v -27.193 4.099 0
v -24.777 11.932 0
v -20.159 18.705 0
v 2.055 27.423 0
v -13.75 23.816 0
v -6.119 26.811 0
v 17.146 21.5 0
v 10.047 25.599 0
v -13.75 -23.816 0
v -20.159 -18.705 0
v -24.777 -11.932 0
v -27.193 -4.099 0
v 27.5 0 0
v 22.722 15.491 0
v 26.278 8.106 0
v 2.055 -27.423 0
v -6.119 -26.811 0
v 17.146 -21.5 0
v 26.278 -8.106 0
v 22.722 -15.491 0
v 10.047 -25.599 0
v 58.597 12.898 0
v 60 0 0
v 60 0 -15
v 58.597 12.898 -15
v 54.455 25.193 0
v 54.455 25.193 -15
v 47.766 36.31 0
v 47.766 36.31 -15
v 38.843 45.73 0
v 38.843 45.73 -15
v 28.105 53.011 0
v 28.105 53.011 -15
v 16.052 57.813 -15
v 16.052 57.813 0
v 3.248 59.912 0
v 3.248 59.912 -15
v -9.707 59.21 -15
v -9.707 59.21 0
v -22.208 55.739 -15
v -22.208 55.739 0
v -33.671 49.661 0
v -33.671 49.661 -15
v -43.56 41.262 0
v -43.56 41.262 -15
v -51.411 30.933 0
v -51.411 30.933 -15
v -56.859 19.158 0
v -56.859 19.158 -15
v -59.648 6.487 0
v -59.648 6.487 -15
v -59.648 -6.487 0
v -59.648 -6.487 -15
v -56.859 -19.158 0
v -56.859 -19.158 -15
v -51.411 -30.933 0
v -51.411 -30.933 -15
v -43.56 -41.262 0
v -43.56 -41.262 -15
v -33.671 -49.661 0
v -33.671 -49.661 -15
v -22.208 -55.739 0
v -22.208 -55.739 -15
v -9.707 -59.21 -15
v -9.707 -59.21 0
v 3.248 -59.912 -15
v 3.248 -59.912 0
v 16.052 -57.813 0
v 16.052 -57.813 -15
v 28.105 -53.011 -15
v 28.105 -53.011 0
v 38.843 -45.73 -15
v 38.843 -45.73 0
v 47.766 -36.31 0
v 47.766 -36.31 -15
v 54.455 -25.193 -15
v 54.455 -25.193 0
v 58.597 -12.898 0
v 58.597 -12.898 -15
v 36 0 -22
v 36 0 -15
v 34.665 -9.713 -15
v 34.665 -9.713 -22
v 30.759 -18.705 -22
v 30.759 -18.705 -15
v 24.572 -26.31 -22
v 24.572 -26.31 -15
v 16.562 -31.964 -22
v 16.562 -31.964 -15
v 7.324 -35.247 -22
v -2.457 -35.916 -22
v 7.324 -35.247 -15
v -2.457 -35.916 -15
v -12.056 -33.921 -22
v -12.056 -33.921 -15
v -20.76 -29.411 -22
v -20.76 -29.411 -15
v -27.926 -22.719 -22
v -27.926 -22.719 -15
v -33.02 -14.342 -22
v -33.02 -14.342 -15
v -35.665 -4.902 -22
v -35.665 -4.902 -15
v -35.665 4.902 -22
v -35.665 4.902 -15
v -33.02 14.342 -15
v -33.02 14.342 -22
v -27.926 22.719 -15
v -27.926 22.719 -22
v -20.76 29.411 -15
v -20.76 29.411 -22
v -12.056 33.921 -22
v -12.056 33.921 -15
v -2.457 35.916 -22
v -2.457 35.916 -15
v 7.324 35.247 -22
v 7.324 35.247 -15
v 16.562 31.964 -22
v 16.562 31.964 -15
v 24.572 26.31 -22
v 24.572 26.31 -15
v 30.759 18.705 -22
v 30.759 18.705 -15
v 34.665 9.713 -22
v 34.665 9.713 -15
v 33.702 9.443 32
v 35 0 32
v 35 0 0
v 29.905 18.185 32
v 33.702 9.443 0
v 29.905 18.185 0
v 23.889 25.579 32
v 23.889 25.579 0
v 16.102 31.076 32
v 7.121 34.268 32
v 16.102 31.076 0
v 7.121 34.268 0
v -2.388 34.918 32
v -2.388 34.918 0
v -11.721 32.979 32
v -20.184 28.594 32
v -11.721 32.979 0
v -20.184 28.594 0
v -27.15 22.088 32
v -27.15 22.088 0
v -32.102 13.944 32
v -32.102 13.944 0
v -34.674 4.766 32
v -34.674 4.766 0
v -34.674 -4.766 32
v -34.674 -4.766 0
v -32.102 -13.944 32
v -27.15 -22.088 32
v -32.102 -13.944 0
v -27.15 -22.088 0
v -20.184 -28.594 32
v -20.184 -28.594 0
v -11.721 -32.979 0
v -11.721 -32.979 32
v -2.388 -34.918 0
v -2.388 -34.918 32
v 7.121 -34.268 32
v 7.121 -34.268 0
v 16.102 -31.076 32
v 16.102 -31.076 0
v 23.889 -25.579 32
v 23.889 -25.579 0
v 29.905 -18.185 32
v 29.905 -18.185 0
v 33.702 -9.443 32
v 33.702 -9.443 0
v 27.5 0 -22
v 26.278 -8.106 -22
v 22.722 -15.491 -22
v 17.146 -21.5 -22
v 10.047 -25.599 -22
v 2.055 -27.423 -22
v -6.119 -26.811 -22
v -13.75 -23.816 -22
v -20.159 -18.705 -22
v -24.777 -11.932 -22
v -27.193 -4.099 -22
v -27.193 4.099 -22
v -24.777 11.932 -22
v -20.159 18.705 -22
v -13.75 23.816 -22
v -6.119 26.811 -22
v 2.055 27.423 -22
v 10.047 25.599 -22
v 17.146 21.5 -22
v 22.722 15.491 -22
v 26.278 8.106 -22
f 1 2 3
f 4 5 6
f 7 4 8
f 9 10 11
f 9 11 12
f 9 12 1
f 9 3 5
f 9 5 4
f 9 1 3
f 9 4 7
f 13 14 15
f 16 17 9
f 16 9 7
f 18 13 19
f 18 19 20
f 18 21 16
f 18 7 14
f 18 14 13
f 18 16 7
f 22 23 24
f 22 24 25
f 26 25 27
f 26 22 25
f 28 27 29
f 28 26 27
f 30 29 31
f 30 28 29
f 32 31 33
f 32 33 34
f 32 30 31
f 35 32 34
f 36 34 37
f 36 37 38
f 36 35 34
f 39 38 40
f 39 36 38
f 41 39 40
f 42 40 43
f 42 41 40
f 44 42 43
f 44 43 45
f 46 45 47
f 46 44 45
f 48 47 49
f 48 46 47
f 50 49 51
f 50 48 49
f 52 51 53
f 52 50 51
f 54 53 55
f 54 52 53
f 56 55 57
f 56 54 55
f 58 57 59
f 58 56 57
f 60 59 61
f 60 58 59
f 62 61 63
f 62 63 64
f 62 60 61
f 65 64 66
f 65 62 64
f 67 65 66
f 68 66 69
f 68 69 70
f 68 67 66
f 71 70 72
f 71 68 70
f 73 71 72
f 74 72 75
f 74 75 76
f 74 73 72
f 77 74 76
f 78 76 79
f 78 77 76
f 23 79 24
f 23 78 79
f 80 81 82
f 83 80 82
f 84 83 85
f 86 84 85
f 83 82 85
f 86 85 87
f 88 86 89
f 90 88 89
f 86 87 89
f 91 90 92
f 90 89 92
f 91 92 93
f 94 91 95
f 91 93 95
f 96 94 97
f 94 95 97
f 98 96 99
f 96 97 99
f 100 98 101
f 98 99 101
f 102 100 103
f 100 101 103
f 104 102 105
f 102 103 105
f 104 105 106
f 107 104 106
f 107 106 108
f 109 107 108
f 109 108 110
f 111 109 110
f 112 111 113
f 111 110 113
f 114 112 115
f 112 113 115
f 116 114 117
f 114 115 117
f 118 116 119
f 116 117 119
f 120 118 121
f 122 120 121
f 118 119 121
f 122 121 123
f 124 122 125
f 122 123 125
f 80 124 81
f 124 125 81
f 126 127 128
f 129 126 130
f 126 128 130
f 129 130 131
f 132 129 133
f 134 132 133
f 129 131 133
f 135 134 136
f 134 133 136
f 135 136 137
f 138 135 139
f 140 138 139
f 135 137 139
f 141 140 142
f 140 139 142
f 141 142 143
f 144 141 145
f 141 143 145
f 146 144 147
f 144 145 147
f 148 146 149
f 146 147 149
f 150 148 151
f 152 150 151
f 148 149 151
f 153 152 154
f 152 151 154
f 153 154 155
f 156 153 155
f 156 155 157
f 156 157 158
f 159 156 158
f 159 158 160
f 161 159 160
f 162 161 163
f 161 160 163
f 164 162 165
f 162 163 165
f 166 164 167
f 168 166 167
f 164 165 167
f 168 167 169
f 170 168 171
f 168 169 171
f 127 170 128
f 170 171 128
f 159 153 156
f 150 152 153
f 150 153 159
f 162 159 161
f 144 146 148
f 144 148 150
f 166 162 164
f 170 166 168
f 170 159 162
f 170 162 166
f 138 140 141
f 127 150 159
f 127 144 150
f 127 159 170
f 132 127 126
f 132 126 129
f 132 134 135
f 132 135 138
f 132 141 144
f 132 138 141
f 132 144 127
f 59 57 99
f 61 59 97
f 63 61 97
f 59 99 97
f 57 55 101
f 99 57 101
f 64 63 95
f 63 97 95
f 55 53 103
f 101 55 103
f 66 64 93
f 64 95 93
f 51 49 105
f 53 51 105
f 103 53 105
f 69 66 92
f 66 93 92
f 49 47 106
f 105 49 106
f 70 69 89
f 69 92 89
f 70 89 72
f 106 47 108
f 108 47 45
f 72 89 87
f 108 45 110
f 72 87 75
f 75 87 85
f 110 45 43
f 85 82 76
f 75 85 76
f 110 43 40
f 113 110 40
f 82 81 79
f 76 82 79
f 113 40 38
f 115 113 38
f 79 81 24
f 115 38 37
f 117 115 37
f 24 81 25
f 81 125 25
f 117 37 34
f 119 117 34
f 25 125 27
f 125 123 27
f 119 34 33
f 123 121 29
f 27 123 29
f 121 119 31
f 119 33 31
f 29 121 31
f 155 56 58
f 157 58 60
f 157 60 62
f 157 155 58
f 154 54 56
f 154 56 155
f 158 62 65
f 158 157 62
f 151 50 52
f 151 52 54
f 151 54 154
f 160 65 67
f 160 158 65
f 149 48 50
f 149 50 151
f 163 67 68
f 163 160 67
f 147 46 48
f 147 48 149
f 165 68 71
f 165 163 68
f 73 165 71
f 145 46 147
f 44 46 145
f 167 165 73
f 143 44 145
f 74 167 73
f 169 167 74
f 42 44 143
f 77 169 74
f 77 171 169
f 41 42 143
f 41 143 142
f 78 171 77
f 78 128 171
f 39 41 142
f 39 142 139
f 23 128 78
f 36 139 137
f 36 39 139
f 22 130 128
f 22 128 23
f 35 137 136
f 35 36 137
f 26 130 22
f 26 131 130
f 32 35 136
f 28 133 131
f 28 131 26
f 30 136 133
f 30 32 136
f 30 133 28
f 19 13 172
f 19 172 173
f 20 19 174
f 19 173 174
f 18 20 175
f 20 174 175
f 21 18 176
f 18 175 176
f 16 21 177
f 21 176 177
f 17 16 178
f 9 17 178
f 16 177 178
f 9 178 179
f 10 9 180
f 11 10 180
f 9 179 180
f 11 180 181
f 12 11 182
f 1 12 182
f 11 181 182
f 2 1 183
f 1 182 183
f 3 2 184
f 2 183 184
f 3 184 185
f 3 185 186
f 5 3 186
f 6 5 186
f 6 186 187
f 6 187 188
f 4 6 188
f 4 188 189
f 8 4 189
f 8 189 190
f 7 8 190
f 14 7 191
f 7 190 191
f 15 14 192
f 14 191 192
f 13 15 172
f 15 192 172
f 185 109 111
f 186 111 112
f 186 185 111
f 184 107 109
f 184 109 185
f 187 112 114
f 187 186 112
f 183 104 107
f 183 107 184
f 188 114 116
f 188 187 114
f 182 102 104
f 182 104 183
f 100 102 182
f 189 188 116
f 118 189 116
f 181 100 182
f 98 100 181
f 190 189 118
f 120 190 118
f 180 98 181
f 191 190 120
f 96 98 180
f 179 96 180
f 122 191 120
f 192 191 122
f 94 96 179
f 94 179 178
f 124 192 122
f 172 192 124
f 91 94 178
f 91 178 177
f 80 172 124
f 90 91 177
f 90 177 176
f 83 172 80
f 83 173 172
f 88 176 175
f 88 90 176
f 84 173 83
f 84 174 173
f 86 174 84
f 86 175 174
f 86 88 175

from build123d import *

# Parameters (mm, degrees)
F0_R     = 60
F1_DEPTH = 15
F2_R     = 35
F3_DEPTH = 32
F4_R     = 36
F5_DEPTH = 7
F6_R     = 27.5
F7_DEPTH = 22


with BuildPart() as f1:
    # F0 (on Top) → F1 (new body)
    with BuildSketch(Plane.XY):
        Circle(F0_R)
    extrude(amount=-F1_DEPTH)

    # F2 (on face) → F3 (join)
    with BuildSketch(Plane.XY):
        Circle(F2_R)
    extrude(amount=F3_DEPTH)

    # F4 (on face) → F5 (join)
    with BuildSketch(Plane(origin=(0, 0, -15), x_dir=(1, 0, 0), z_dir=(0, 0, -1))):
        Circle(F4_R)
    extrude(amount=F5_DEPTH)

    # F6 (on face) → F7 (cut)
    with BuildSketch(Plane(origin=(0, 0, -22), x_dir=(1, 0, 0), z_dir=(0, 0, -1))):
        Circle(F6_R)
    extrude(amount=-F7_DEPTH, mode=Mode.SUBTRACT)


solid = f1.part
